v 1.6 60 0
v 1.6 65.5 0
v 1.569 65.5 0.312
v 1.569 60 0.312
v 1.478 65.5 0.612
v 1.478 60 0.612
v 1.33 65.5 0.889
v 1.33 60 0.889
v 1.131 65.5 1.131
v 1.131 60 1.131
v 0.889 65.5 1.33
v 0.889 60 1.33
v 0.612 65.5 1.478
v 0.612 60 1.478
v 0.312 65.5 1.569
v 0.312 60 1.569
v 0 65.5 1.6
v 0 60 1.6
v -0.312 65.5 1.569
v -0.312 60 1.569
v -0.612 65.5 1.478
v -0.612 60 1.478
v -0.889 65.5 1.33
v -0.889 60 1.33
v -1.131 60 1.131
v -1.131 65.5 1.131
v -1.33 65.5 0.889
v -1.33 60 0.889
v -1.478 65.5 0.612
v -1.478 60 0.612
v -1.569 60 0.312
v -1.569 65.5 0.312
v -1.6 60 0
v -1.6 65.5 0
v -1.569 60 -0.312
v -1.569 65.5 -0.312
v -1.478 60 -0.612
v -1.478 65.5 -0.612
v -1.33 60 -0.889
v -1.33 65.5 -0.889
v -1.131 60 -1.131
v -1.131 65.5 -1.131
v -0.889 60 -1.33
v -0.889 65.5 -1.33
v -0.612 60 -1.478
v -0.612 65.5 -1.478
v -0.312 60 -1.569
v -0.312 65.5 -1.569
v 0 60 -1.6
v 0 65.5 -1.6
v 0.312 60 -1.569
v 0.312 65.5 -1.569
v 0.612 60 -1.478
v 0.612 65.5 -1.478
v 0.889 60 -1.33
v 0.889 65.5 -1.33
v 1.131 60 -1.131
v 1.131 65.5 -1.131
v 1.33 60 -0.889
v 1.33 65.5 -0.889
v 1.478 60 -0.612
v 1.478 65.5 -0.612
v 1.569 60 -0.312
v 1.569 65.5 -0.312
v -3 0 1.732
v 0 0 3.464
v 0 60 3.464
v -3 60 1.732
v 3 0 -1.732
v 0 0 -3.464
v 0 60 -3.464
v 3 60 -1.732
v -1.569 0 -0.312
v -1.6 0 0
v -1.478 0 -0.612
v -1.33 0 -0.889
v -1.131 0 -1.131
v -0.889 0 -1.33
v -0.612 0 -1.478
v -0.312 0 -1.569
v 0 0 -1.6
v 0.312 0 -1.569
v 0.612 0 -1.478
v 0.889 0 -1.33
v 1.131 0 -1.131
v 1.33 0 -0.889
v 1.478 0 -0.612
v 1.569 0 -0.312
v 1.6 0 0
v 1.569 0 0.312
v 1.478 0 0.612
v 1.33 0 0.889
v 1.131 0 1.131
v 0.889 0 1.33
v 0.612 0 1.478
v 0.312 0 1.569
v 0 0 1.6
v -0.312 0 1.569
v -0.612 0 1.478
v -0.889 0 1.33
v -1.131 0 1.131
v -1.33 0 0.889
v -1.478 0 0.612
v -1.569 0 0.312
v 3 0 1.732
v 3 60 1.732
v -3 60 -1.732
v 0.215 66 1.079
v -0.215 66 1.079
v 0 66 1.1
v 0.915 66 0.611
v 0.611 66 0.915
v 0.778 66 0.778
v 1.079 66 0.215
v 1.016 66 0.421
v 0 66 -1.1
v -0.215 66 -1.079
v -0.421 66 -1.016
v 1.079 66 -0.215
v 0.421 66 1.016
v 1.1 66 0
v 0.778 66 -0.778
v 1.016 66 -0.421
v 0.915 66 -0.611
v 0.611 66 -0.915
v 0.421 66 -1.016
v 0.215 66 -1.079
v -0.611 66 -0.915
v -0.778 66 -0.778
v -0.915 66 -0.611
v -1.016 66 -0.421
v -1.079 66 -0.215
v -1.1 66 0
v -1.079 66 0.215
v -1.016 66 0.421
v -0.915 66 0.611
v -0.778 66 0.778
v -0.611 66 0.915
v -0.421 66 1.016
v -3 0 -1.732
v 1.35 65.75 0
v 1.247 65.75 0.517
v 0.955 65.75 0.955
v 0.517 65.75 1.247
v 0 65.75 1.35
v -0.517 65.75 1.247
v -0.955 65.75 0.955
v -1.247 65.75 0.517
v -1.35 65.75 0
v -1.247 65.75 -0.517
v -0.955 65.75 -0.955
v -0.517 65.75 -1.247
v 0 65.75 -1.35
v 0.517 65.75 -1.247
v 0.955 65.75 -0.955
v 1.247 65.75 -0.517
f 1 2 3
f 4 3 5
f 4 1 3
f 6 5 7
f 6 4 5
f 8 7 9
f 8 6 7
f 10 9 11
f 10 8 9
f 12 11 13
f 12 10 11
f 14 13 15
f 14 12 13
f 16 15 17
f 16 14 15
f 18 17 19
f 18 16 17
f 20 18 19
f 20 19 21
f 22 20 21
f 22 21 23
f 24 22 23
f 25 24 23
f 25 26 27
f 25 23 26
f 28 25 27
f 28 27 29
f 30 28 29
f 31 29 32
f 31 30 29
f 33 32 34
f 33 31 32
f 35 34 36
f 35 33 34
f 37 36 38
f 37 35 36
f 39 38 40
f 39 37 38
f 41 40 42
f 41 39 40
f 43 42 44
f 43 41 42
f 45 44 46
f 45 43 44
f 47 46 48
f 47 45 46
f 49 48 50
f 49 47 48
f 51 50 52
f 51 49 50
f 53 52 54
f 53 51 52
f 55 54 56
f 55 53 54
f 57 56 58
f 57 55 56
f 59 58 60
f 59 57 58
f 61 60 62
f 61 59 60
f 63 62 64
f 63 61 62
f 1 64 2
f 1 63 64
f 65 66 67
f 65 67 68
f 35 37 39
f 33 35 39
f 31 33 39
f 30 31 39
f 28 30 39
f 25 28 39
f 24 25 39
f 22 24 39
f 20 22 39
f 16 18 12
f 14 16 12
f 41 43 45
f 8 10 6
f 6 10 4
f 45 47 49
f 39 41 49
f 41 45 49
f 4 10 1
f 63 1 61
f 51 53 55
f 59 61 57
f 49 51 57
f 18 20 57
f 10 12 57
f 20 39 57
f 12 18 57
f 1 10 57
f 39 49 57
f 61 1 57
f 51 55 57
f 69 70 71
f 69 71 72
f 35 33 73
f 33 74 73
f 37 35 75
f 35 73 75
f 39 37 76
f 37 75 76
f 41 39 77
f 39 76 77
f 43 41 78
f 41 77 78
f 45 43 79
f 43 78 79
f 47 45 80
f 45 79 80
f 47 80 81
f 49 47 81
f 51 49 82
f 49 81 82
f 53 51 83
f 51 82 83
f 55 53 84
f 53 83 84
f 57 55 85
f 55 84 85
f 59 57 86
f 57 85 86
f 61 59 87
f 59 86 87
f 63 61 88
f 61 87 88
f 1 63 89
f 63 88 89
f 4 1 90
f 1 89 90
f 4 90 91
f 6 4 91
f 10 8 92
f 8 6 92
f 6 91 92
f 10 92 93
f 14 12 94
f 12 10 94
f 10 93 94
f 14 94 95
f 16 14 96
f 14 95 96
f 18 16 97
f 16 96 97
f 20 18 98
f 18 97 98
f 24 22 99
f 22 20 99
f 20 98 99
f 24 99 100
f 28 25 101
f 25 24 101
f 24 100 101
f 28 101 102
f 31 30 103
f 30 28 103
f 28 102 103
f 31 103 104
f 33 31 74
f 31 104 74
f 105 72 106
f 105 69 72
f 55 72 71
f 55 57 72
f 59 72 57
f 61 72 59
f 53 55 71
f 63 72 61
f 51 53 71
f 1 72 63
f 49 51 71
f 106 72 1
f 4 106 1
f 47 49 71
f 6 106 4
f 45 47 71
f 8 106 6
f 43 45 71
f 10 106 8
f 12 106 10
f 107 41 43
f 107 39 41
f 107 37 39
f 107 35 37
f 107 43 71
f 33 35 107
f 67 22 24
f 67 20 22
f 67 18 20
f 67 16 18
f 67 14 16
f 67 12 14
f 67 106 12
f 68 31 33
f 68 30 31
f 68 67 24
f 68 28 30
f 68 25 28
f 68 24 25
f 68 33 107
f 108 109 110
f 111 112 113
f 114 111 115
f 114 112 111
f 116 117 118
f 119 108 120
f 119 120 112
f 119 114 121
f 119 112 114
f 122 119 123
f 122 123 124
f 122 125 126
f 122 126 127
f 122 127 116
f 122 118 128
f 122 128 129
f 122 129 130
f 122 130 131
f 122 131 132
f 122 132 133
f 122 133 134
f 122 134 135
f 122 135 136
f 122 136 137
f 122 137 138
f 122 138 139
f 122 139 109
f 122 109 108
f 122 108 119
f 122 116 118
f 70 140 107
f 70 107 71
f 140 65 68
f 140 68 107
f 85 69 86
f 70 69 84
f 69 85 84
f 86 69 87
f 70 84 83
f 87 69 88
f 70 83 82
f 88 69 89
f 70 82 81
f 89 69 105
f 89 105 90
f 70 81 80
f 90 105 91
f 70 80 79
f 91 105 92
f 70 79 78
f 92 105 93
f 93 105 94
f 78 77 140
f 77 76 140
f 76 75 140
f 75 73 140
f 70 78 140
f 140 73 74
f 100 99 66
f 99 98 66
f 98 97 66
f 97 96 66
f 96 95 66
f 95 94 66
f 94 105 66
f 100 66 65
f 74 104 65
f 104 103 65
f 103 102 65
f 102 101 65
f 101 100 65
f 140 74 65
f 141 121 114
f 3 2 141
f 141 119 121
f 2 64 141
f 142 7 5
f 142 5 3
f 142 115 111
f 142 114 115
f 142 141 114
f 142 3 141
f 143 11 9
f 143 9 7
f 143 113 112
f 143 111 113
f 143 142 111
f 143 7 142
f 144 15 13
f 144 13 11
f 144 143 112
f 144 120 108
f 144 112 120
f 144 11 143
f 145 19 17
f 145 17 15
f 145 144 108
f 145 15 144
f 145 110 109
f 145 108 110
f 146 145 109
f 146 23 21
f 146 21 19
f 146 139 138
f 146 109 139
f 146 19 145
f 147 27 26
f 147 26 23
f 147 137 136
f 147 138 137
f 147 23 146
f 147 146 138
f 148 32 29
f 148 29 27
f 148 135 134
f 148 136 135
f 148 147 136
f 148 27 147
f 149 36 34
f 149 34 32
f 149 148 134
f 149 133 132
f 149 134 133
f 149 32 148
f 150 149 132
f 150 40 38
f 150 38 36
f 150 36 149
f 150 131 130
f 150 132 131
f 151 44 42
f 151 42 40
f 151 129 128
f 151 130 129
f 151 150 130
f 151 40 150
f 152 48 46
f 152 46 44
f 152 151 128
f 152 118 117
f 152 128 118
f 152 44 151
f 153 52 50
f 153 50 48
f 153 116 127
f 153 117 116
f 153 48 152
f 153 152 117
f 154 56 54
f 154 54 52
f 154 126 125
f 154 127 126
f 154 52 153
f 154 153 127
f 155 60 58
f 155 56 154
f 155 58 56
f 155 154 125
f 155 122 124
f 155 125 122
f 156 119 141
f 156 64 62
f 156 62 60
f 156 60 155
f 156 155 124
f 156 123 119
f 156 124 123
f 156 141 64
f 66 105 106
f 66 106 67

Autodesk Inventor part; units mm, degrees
ref_plane "YZ Plane" through (0, 0, 0) normal (1, 0, 0) x (0, 1, 0)
ref_plane "XZ Plane" through (0, 0, 0) normal (0, 1, 0) x (-1, 0, 0)
ref_plane "XY Plane" through (0, 0, 0) normal (0, 0, 1) x (1, 0, 0)
sketch "Sketch1" plane through (0, 0, 0) normal (0, 1, 0) x (-1, 0, 0)
  circle A0 centre (0, 0) radius 1.6
  line L0 (0, -3.4641) -> (-3, -1.7321)
  line L1 (-3, -1.7321) -> (-3, 1.7321)
  line L2 (-3, 1.7321) -> (0, 3.4641)
  line L3 (0, 3.4641) -> (3, 1.7321)
  line L4 (3, 1.7321) -> (3, -1.7321)
  line L5 (3, -1.7321) -> (0, -3.4641)
  dimension "d0" = 3.2
  dimension "d1" = 6
extrude "Extrusion1" add sketch "Sketch1" along normal blind 60
sketch "Sketch2" plane through (0, 60, 0) normal (0, 1, 0) x (1, 0, 0)
  circle A0 centre (0, 0) radius 1.6 projected
  line L0 (3, 1.7321) -> (0, 3.4641) projected
  line L1 (0, 3.4641) -> (-3, 1.7321) projected
  line L2 (-3, 1.7321) -> (-3, -1.7321) projected
  line L3 (-3, -1.7321) -> (0, -3.4641) projected
  line L4 (0, -3.4641) -> (3, -1.7321) projected
  line L5 (3, -1.7321) -> (3, 1.7321) projected
extrude "Extrusion2" add sketch "Sketch2" along normal blind 6 contours A0
chamfer "Chamfer1" distance 0.5 angle 45 1 edges at (-1.6, 66, 0)
thread "Thread1" size "M3.5x0.6" class "6g" standard "ANSI Metric M Profile" full length
properties part number "Standoff 40" material "Brass"
